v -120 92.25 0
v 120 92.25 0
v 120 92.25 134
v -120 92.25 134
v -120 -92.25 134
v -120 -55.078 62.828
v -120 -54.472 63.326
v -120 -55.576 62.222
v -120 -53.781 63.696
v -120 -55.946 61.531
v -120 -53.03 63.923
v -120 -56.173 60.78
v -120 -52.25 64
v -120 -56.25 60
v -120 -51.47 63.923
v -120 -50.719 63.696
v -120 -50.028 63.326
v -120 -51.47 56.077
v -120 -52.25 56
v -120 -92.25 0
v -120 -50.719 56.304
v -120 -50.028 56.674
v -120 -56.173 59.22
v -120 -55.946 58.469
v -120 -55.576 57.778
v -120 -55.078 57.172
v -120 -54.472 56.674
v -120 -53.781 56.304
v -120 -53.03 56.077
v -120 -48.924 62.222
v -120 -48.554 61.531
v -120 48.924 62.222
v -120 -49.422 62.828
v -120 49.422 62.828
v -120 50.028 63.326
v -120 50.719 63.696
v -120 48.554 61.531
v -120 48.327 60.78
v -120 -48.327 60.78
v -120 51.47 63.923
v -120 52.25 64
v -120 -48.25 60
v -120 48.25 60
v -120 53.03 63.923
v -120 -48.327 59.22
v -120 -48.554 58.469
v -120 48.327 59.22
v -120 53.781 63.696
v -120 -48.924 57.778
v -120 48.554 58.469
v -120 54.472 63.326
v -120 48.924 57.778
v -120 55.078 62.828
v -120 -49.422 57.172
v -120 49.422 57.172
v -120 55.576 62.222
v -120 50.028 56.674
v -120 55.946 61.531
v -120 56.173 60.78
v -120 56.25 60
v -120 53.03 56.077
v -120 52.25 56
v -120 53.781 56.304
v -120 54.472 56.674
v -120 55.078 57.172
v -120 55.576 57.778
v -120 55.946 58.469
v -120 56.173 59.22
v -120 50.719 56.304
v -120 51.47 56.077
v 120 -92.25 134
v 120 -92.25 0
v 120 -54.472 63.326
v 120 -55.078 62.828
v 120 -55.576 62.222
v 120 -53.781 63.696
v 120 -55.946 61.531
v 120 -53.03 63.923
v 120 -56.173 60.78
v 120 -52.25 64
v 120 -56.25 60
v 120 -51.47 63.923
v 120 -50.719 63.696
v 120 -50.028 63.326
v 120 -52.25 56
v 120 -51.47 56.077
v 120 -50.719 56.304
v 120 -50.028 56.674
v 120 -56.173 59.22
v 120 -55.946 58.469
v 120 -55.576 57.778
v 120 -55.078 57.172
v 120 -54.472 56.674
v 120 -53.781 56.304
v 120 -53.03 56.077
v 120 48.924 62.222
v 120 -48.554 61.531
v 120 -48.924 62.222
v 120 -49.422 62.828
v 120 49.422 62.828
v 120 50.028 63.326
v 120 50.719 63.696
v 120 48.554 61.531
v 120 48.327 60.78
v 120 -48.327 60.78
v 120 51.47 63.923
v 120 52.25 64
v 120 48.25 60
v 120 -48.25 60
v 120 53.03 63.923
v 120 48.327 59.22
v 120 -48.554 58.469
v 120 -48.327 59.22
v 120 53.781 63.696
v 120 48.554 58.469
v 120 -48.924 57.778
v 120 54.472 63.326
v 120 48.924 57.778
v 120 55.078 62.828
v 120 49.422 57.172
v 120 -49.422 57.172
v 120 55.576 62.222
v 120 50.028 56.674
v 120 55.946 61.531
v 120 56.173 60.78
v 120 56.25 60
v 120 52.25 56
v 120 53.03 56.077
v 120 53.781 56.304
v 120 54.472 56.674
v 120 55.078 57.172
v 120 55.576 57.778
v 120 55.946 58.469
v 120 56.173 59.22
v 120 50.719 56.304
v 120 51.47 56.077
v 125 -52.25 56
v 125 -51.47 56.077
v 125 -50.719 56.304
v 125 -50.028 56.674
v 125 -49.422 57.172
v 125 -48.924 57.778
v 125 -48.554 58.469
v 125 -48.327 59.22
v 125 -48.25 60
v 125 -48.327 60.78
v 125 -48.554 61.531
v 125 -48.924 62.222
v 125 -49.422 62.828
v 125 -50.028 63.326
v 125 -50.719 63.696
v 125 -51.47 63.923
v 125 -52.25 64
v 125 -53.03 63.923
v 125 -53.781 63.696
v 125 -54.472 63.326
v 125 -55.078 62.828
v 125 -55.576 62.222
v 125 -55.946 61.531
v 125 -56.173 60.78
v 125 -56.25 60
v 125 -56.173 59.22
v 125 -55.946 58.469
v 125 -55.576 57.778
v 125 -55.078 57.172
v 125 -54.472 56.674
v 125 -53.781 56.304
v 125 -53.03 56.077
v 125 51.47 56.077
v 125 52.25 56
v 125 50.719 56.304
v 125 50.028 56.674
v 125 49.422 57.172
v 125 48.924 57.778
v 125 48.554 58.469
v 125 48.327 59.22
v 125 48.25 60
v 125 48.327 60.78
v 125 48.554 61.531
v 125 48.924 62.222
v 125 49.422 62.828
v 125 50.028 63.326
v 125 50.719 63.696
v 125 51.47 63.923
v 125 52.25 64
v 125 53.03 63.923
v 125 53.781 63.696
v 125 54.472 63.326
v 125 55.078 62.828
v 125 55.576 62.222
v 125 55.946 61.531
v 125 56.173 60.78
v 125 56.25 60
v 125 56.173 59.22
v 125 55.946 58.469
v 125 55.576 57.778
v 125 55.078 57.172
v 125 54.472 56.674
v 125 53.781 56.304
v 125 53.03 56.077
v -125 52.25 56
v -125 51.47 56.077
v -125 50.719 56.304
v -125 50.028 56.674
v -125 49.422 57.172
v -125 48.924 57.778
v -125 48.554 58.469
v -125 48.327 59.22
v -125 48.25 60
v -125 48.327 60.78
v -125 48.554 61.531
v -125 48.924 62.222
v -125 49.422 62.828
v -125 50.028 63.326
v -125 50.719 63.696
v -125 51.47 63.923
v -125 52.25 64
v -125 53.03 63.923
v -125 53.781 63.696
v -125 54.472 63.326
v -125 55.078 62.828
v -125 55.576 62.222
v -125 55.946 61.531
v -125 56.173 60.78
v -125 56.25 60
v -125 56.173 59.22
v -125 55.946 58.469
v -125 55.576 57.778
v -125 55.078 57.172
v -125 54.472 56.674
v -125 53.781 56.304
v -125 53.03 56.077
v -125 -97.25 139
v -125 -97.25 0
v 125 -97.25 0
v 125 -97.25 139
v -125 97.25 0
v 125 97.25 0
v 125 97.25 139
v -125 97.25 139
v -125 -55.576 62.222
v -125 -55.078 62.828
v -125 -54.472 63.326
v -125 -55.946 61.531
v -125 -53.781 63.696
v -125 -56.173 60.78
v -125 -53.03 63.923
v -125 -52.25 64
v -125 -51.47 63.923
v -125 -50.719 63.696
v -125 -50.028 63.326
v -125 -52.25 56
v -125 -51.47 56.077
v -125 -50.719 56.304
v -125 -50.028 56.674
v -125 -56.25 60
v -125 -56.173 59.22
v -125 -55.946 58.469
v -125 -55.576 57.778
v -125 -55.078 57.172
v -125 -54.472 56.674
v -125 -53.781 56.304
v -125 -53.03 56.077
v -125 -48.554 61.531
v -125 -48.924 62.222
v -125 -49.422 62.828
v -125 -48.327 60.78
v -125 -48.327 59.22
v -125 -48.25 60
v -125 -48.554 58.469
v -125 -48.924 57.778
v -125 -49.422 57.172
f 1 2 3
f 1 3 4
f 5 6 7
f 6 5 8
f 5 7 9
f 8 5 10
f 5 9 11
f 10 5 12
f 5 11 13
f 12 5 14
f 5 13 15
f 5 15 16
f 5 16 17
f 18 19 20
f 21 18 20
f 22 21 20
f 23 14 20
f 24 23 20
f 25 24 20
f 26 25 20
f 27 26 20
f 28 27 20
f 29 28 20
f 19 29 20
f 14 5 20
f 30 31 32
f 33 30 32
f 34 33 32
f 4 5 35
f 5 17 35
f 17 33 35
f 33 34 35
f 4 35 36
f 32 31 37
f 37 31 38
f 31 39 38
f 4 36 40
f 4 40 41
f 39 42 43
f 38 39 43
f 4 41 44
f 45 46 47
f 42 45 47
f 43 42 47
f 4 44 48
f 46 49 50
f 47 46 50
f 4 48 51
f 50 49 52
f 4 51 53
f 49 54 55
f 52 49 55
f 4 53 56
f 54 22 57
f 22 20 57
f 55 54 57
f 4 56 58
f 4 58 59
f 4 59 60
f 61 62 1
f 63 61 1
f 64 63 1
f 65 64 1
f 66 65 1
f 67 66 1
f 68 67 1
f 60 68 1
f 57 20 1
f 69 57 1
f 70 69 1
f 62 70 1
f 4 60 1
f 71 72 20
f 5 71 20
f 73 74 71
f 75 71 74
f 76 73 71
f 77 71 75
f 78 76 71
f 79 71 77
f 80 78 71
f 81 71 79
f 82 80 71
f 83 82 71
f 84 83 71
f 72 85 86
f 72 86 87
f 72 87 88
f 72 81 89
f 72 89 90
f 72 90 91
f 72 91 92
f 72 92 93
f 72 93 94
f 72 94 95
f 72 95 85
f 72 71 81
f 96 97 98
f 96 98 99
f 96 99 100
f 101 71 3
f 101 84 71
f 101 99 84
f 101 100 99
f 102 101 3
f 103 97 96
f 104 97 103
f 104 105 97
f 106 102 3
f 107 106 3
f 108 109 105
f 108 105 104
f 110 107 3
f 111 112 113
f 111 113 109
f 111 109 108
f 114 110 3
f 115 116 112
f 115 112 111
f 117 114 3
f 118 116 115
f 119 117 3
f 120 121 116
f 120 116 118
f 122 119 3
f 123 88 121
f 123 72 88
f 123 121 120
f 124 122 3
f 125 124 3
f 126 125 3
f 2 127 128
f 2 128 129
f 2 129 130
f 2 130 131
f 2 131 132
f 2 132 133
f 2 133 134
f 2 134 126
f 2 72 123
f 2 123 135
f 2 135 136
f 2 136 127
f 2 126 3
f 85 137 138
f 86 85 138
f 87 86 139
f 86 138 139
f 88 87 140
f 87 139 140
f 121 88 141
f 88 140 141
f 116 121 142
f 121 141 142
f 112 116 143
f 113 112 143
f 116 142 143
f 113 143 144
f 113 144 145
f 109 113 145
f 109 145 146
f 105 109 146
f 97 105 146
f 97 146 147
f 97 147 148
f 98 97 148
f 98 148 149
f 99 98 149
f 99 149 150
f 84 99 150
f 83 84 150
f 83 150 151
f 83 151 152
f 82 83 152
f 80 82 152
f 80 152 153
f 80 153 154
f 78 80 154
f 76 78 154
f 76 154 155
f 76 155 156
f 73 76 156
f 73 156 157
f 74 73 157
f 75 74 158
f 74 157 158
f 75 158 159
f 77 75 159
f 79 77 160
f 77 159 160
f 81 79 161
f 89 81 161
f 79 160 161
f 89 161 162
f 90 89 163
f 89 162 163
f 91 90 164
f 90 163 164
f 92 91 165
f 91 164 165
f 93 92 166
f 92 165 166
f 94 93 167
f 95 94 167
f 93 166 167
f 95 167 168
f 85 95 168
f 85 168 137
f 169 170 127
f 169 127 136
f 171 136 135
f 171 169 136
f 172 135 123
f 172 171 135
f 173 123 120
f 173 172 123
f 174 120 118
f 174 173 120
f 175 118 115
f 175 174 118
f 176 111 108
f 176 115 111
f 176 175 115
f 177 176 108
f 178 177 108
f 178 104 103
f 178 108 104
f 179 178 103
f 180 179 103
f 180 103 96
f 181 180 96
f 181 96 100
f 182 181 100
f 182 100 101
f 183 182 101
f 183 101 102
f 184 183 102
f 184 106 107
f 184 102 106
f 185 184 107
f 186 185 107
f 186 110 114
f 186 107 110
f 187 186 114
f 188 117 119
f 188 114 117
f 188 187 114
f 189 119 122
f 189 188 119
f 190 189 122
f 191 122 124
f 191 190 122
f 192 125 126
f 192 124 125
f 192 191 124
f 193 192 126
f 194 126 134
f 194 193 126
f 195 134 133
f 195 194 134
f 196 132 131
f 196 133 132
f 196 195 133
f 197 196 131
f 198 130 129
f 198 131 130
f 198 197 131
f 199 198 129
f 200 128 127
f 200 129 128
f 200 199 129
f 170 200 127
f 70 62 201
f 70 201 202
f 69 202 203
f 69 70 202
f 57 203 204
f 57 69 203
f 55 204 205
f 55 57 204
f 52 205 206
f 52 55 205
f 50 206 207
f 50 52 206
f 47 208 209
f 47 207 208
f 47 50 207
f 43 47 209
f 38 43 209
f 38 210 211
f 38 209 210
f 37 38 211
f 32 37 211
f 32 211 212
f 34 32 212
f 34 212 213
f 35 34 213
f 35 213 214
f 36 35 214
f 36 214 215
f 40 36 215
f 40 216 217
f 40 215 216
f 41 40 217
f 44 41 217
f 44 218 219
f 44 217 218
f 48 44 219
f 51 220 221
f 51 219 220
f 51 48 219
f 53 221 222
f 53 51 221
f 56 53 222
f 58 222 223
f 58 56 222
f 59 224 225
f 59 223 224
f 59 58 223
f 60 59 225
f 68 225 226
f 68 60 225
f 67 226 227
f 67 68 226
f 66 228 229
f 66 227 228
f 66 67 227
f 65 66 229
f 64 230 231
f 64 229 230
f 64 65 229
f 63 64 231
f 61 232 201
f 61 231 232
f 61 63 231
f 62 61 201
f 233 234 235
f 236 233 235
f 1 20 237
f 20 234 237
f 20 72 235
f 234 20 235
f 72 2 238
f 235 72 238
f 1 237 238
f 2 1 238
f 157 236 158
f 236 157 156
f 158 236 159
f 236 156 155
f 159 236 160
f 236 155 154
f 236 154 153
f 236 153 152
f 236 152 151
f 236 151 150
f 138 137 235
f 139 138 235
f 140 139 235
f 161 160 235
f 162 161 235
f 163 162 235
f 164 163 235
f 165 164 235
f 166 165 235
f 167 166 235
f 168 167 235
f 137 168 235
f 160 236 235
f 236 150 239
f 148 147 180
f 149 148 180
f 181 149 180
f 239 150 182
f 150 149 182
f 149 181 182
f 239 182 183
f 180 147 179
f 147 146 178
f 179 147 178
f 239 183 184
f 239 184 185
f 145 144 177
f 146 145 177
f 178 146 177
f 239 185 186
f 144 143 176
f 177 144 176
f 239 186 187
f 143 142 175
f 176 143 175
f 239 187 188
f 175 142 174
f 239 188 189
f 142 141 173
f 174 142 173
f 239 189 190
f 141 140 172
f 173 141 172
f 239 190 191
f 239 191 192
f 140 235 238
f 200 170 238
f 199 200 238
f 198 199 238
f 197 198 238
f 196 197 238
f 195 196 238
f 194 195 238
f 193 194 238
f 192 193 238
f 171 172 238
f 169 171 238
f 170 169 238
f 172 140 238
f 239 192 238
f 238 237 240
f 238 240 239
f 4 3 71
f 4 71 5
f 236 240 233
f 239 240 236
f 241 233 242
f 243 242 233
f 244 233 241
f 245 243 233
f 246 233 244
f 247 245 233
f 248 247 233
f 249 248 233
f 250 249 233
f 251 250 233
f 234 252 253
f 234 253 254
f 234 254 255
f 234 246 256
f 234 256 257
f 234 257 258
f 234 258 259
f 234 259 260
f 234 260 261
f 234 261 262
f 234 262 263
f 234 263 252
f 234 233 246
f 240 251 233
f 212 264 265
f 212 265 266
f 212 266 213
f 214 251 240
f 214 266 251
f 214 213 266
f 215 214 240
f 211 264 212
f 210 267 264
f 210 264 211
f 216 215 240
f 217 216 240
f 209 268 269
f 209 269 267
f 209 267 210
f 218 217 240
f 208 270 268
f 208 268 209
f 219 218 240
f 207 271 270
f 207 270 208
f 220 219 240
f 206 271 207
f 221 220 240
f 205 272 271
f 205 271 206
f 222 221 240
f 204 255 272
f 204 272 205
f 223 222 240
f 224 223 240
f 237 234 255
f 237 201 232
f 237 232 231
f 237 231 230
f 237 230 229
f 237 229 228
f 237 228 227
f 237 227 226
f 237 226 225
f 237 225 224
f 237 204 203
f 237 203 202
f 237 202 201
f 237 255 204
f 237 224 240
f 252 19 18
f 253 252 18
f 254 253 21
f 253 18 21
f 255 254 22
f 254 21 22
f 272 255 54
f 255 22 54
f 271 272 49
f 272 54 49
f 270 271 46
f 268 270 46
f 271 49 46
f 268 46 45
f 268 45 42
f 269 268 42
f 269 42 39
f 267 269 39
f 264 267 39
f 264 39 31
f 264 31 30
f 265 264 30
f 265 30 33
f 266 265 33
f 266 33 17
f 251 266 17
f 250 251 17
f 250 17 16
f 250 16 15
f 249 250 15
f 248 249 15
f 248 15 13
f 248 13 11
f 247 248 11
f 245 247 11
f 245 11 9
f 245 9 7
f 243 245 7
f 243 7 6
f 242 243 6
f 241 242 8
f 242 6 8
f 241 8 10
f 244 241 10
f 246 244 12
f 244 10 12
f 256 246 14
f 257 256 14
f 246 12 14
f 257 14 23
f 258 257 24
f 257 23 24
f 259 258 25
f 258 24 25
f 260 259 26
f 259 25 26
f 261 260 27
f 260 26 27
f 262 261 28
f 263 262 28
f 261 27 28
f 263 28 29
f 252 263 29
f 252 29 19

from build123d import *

# Parameters (mm, degrees)
SKIZZE1_W                       = 250
SKIZZE1_H                       = 194.5
AUFSATZ_LINEAR_AUSTRAGEN1_DEPTH = 139
SKIZZE2_W                       = 240
SKIZZE2_H                       = 184.5
SCHNITT_LINEAR_AUSTRAGEN1_DEPTH = 134
F_8_0MM_STIFTLOCH1_D            = 8


with BuildPart() as part:
    # Skizze1 → Aufsatz-Linear austragen1 (new body)
    with BuildSketch(Plane.XY):
        Rectangle(SKIZZE1_W, SKIZZE1_H)
    extrude(amount=AUFSATZ_LINEAR_AUSTRAGEN1_DEPTH)

    # Skizze2 → Schnitt-Linear austragen1 (cut)
    with BuildSketch(Plane(origin=(0, 0, 0), x_dir=(-1, 0, 0), z_dir=(0, 0, -1))):
        Rectangle(SKIZZE2_W, SKIZZE2_H)
    extrude(amount=-SCHNITT_LINEAR_AUSTRAGEN1_DEPTH, mode=Mode.SUBTRACT)

    # Ø8.0mm Stiftloch1 (through all)
    with Locations(Plane.ZY.offset(125)):
        with Locations((60, -52.25)):
            f_8_0mm_stiftloch1 = Hole(F_8_0MM_STIFTLOCH1_D / 2)

    # Spiegeln1: Ø8.0mm Stiftloch1 across plane
    add(f_8_0mm_stiftloch1.mirror(Plane.ZX), mode=Mode.SUBTRACT)


solid = part.part
